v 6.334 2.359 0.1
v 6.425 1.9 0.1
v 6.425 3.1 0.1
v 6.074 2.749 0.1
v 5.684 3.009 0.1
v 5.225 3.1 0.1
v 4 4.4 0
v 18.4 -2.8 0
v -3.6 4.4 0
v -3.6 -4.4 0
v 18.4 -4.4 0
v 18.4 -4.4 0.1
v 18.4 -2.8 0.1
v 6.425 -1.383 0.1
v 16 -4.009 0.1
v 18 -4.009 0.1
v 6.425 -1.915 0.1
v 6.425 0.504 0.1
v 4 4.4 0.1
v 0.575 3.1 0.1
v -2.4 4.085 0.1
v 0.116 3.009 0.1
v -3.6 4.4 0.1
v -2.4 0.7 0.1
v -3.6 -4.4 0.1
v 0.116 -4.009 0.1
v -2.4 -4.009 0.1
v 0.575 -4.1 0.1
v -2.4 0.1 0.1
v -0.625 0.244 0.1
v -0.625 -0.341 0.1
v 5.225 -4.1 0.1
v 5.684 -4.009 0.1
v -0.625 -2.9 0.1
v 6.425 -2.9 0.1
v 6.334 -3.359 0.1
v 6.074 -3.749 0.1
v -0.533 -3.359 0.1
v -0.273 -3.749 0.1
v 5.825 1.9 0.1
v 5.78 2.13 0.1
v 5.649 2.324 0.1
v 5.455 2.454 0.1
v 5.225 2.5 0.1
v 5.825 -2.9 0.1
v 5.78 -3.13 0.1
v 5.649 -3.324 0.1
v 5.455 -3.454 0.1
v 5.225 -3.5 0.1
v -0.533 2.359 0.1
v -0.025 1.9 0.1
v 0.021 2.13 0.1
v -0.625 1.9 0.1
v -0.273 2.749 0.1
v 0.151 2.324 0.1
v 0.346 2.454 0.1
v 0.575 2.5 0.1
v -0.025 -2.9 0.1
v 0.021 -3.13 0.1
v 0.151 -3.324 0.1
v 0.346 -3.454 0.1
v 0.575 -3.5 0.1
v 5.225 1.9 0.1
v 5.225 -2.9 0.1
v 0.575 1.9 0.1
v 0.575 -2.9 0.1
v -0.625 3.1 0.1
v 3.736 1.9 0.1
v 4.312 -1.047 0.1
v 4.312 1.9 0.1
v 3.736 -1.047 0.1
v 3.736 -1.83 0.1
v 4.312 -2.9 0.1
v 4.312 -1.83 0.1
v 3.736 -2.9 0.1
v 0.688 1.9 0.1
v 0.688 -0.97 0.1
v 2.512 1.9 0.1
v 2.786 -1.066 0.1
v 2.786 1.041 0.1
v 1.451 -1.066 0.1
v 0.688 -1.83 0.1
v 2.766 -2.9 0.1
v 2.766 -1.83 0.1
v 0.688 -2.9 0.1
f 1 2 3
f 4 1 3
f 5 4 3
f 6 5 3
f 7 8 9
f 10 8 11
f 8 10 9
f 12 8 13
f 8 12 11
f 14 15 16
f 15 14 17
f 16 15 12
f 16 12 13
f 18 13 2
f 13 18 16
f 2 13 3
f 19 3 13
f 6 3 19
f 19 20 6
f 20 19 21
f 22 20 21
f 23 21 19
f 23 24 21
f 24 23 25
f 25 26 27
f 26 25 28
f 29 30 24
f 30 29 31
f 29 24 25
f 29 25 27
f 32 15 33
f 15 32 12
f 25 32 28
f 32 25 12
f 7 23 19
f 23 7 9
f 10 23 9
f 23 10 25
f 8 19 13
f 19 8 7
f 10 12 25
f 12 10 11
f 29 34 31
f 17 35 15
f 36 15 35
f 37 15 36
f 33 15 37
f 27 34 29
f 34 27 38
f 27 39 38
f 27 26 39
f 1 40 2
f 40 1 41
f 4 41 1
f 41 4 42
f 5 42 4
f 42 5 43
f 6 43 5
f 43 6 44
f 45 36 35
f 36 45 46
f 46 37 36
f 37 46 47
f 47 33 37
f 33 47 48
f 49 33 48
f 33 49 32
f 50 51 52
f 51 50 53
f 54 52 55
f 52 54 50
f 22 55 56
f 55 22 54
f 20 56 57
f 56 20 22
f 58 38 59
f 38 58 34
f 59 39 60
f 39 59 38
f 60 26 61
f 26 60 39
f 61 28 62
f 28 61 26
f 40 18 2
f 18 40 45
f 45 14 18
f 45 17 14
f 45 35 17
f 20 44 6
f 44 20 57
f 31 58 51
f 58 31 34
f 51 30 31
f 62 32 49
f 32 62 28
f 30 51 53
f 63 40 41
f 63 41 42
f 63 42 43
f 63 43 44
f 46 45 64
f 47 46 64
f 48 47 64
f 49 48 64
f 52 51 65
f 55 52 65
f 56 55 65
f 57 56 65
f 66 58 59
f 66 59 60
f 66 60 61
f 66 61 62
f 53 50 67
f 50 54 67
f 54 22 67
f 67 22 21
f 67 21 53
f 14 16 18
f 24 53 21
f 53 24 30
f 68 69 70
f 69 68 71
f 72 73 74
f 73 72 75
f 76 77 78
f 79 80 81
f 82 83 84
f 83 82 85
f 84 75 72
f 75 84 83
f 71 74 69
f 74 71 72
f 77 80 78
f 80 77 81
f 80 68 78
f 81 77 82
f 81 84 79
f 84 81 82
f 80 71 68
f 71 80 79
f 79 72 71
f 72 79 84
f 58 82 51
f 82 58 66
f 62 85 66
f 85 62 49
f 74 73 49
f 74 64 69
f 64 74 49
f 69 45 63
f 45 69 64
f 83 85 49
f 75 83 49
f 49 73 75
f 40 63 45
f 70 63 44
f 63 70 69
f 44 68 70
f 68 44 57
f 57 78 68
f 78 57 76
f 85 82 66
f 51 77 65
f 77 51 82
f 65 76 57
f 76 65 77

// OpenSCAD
// file: ../p/1-4ndis.scad
use <../lib.scad>
function ldraw_lib__1_4ndis() = [
// 0 Disc Negative 0.25
// 0 Name: 1-4ndis.dat
// 0 Author: James Jessiman
// 0 !LDRAW_ORG Primitive UPDATE 2012-01
// 0 !LICENSE Licensed under CC BY 4.0 : see CAreadme.txt
// 
// 0 BFC CERTIFY CCW
  [0,"BFC","CERTIFY"],
  [0,"BFC","CCW"],
// 
// 0 !HISTORY 2002-03-23 [sbliss] Added BFC Statement
// 0 !HISTORY 2002-04-25 [PTadmin] Official Update 2002-02
// 0 !HISTORY 2007-06-22 [PTadmin] Header formatted for Contributor Agreement
// 0 !HISTORY 2008-07-01 [PTadmin] Official Update 2008-01
// 0 !HISTORY 2012-02-16 [Philo] Changed to CCW
// 0 !HISTORY 2012-03-30 [PTadmin] Official Update 2012-01
// 
// 
// 3 16 0.9239 0 0.3827 1 0 0 1 0 1
  [3,16,0.9239,0,0.3827,1,0,0,1,0,1],
// 3 16 0.7071 0 0.7071 0.9239 0 0.3827 1 0 1
  [3,16,0.7071,0,0.7071,0.9239,0,0.3827,1,0,1],
// 3 16 0.3827 0 0.9239 0.7071 0 0.7071 1 0 1
  [3,16,0.3827,0,0.9239,0.7071,0,0.7071,1,0,1],
// 3 16 0 0 1 0.3827 0 0.9239 1 0 1
  [3,16,0,0,1,0.3827,0,0.9239,1,0,1],
];
module ldraw_lib__1_4ndis(step=0, col=false, unit=2/5, alt=false, line=0.2, solid=!$preview)
    makepoly(ldraw_lib__1_4ndis(), step=step, col=col, unit=unit, alt=alt, line=line, solid=solid);
ldraw_lib__1_4ndis(line=0.2);
// file: ../p/3-16ndis.scad
use <../lib.scad>
function ldraw_lib__3_16ndis() = [
// 0 Disc Negative 0.1875
// 0 Name: 3-16ndis.dat
// 0 Author: Guy Vivan [guyvivan]
// 0 !LDRAW_ORG Primitive UPDATE 2009-01
// 0 !LICENSE Licensed under CC BY 2.0 and CC BY 4.0 : see CAreadme.txt
// 
// 0 BFC CERTIFY CCW
  [0,"BFC","CERTIFY"],
  [0,"BFC","CCW"],
// 
// 0 !HISTORY 2009-05-02 [PTadmin] Official Update 2009-01
// 
// 
// 3 16 1 0 1 0.9239 0 0.3827 1 0 0
  [3,16,1,0,1,0.9239,0,0.3827,1,0,0],
// 3 16 1 0 1 0.7071 0 0.7071 0.9239 0 0.3827
  [3,16,1,0,1,0.7071,0,0.7071,0.9239,0,0.3827],
// 3 16 1 0 1 0.3827 0 0.9239 0.7071 0 0.7071
  [3,16,1,0,1,0.3827,0,0.9239,0.7071,0,0.7071],
// 
// 0 end of file
// 
];
module ldraw_lib__3_16ndis(step=0, col=false, unit=2/5, alt=false, line=0.2, solid=!$preview)
    makepoly(ldraw_lib__3_16ndis(), step=step, col=col, unit=unit, alt=alt, line=line, solid=solid);
ldraw_lib__3_16ndis(line=0.2);
// file: ../p/1-4ring1.scad
use <../lib.scad>
function ldraw_lib__1_4ring1() = [
// 0 Ring  1 x 0.25
// 0 Name: 1-4ring1.dat
// 0 Author: Chris Dee [cwdee]
// 0 !LDRAW_ORG Primitive UPDATE 2012-01
// 0 !LICENSE Licensed under CC BY 2.0 and CC BY 4.0 : see CAreadme.txt
// 
// 0 BFC CERTIFY CCW
  [0,"BFC","CERTIFY"],
  [0,"BFC","CCW"],
// 
// 0 !HISTORY 2000-05-07 [PTadmin] Official Update 2000-01
// 0 !HISTORY 2002-11-22 [hafhead] Added BFC statement
// 0 !HISTORY 2002-11-30 [PTadmin] Official Update 2002-05
// 0 !HISTORY 2007-06-22 [PTadmin] Header formatted for Contributor Agreement
// 0 !HISTORY 2008-07-01 [PTadmin] Official Update 2008-01
// 0 !HISTORY 2012-02-16 [Philo] Changed to CCW
// 0 !HISTORY 2012-03-30 [PTadmin] Official Update 2012-01
// 
// 
// 4 16 2 0 0 1.8478 0 0.7654 0.9239 0 0.3827 1 0 0
  [4,16,2,0,0,1.8478,0,0.7654,0.9239,0,0.3827,1,0,0],
// 4 16 1.8478 0 0.7654 1.4142 0 1.4142 0.7071 0 0.7071 0.9239 0 0.3827
  [4,16,1.8478,0,0.7654,1.4142,0,1.4142,0.7071,0,0.7071,0.9239,0,0.3827],
// 4 16 1.4142 0 1.4142 0.7654 0 1.8478 0.3827 0 0.9239 0.7071 0 0.7071
  [4,16,1.4142,0,1.4142,0.7654,0,1.8478,0.3827,0,0.9239,0.7071,0,0.7071],
// 4 16 0.7654 0 1.8478 0 0 2 0 0 1 0.3827 0 0.9239
  [4,16,0.7654,0,1.8478,0,0,2,0,0,1,0.3827,0,0.9239],
];
module ldraw_lib__1_4ring1(step=0, col=false, unit=2/5, alt=false, line=0.2, solid=!$preview)
    makepoly(ldraw_lib__1_4ring1(), step=step, col=col, unit=unit, alt=alt, line=line, solid=solid);
ldraw_lib__1_4ring1(line=0.2);
// file: ../p/1-4disc.scad
use <../lib.scad>
function ldraw_lib__1_4disc() = [
// 0 Disc 0.25
// 0 Name: 1-4disc.dat
// 0 Author: James Jessiman
// 0 !LDRAW_ORG Primitive UPDATE 2002-02
// 0 !LICENSE Licensed under CC BY 4.0 : see CAreadme.txt
// 
// 0 BFC CERTIFY CCW
  [0,"BFC","CERTIFY"],
  [0,"BFC","CCW"],
// 
// 0 !HISTORY 2002-03-23 [sbliss] Added BFC statement.
// 0 !HISTORY 2002-04-25 [PTadmin] Official Update 2002-02
// 0 !HISTORY 2007-06-22 [PTadmin] Header formatted for Contributor Agreement
// 0 !HISTORY 2008-07-01 [PTadmin] Official Update 2008-01
// 
// 
// 3 16 0 0 0 1 0 0 0.9239 0 0.3827
  [3,16,0,0,0,1,0,0,0.9239,0,0.3827],
// 3 16 0 0 0 0.9239 0 0.3827 0.7071 0 0.7071
  [3,16,0,0,0,0.9239,0,0.3827,0.7071,0,0.7071],
// 3 16 0 0 0 0.7071 0 0.7071 0.3827 0 0.9239
  [3,16,0,0,0,0.7071,0,0.7071,0.3827,0,0.9239],
// 3 16 0 0 0 0.3827 0 0.9239 0 0 1
  [3,16,0,0,0,0.3827,0,0.9239,0,0,1],
// 0
];
module ldraw_lib__1_4disc(step=0, col=false, unit=2/5, alt=false, line=0.2, solid=!$preview)
    makepoly(ldraw_lib__1_4disc(), step=step, col=col, unit=unit, alt=alt, line=line, solid=solid);
ldraw_lib__1_4disc(line=0.2);
// file: ../p/type-swiss721bt-bold-n4.scad
use <../lib.scad>
function ldraw_lib__type_swiss721bt_bold_n4() = [
// 0 Type Swiss721BT Number "4" Bold
// 0 Name: type-swiss721bt-bold-n4.dat
// 0 Author: Ulrich Röder [UR]
// 0 !LDRAW_ORG Primitive UPDATE 2019-01
// 0 !LICENSE Licensed under CC BY 4.0 : see CAreadme.txt
// 
// 0 BFC CERTIFY CCW
  [0,"BFC","CERTIFY"],
  [0,"BFC","CCW"],
// 
// 0 !HISTORY 2019-06-28 [PTadmin] Official Update 2019-01
// 
// 
// 0 // Main
// 4 16 .3775 0 .5 .2575 0 .5 .2575 0 -.114 .3775 0 -.114
  [4,16,.3775,0,.5,.2575,0,.5,.2575,0,-.114,.3775,0,-.114],
// 4 16 .2575 0 -.5 .3775 0 -.5 .3775 0 -.277 .2575 0 -.277
  [4,16,.2575,0,-.5,.3775,0,-.5,.3775,0,-.277,.2575,0,-.277],
// 3 16 -.3775 0 .5 -.3775 0 -.098 .0025 0 .5
  [3,16,-.3775,0,.5,-.3775,0,-.098,.0025,0,.5],
// 3 16 .0595 0 -.118 .0595 0 .321 -.2185 0 -.118
  [3,16,.0595,0,-.118,.0595,0,.321,-.2185,0,-.118],
// 4 16 .0555 0 -.5 .0555 0 -.277 -.3775 0 -.277 -.3775 0 -.5
  [4,16,.0555,0,-.5,.0555,0,-.277,-.3775,0,-.277,-.3775,0,-.5],
// 
// 0 // Black
// 4 0 .0555 0 -.5 .2575 0 -.5 .2575 0 -.277 .0555 0 -.277
  [4,0,.0555,0,-.5,.2575,0,-.5,.2575,0,-.277,.0555,0,-.277],
// 4 0 .2575 0 -.114 .2575 0 -.277 .3775 0 -.277 .3775 0 -.114
  [4,0,.2575,0,-.114,.2575,0,-.277,.3775,0,-.277,.3775,0,-.114],
// 4 0 -.2185 0 -.118 .0595 0 .321 .0025 0 .5 -.3775 0 -.098
  [4,0,-.2185,0,-.118,.0595,0,.321,.0025,0,.5,-.3775,0,-.098],
// 3 0 .0595 0 .321 .2575 0 .5 .0025 0 .5
  [3,0,.0595,0,.321,.2575,0,.5,.0025,0,.5],
// 3 0 -.2185 0 -.118 -.3775 0 -.098 -.3775 0 -.277
  [3,0,-.2185,0,-.118,-.3775,0,-.098,-.3775,0,-.277],
// 4 0 .0595 0 -.118 -.2185 0 -.118 -.3775 0 -.277 .0555 0 -.277
  [4,0,.0595,0,-.118,-.2185,0,-.118,-.3775,0,-.277,.0555,0,-.277],
// 4 0 .2575 0 -.114 .2575 0 .5 .0595 0 .321 .0595 0 -.118
  [4,0,.2575,0,-.114,.2575,0,.5,.0595,0,.321,.0595,0,-.118],
// 4 0 .0555 0 -.277 .2575 0 -.277 .2575 0 -.114 .0595 0 -.118
  [4,0,.0555,0,-.277,.2575,0,-.277,.2575,0,-.114,.0595,0,-.118],
];
module ldraw_lib__type_swiss721bt_bold_n4(step=0, col=false, unit=2/5, alt=false, line=0.2, solid=!$preview)
    makepoly(ldraw_lib__type_swiss721bt_bold_n4(), step=step, col=col, unit=unit, alt=alt, line=line, solid=solid);
ldraw_lib__type_swiss721bt_bold_n4(line=0.2);
// file: s/821435as03.scad
use <../../lib.scad>
use <../../p/1-4ndis.scad>
function ldraw_lib__s__821435as03() = [
// 0 ~Sticker Sloped Body for Racing Number
// 0 Name: s\821435as03.dat
// 0 Author: Ulrich Röder [UR]
// 0 !LDRAW_ORG Subpart UPDATE 2019-01
// 0 !LICENSE Licensed under CC BY 4.0 : see CAreadme.txt
// 
// 0 BFC CERTIFY CCW
  [0,"BFC","CERTIFY"],
  [0,"BFC","CCW"],
// 
// 0 !HISTORY 2019-06-28 [PTadmin] Official Update 2019-01
// 
// 
// 0 // Main
// 1 16 13.063 -.25 4.75 3 0 0 0 1 0 0 0 3 1-4ndis.dat
  [1,16,13.063,-.25,4.75,3,0,0,0,1,0,0,0,3, ldraw_lib__1_4ndis()],
// 3 16 10 0 11 46 0 -7 -9 0 11
  [3,16,10,0,11,46,0,-7,-9,0,11],
// 4 16 -9 0 -11 -9 0 11 46 0 -7 46 0 -11
  [4,16,-9,0,-11,-9,0,11,46,0,-7,46,0,-11],
// 4 16 46 -.25 -11 46 0 -11 46 0 -7 46 -.25 -7
  [4,16,46,-.25,-11,46,0,-11,46,0,-7,46,-.25,-7],
// 4 16 16.063 -.25 -4.788 40 -.25 -10.022 45 -.25 -10.022 16.063 -.25 -3.458
  [4,16,16.063,-.25,-4.788,40,-.25,-10.022,45,-.25,-10.022,16.063,-.25,-3.458],
// 3 16 45 -.25 -10.022 40 -.25 -10.022 46 -.25 -11
  [3,16,45,-.25,-10.022,40,-.25,-10.022,46,-.25,-11],
// 3 16 45 -.25 -10.022 46 -.25 -11 46 -.25 -7
  [3,16,45,-.25,-10.022,46,-.25,-11,46,-.25,-7],
// 4 16 16.063 -.25 4.75 16.063 -.25 1.261 45 -.25 -10.022 46 -.25 -7
  [4,16,16.063,-.25,4.75,16.063,-.25,1.261,45,-.25,-10.022,46,-.25,-7],
// 3 16 16.063 -.25 4.75 46 -.25 -7 16.063 -.25 7.75
  [3,16,16.063,-.25,4.75,46,-.25,-7,16.063,-.25,7.75],
// 3 16 10 -.25 11 16.063 -.25 7.75 46 -.25 -7
  [3,16,10,-.25,11,16.063,-.25,7.75,46,-.25,-7],
// 3 16 13.063 -.25 7.75 16.063 -.25 7.75 10 -.25 11
  [3,16,13.063,-.25,7.75,16.063,-.25,7.75,10,-.25,11],
// 4 16 -6 -.25 10.213 1.438 -.25 7.75 13.063 -.25 7.75 10 -.25 11
  [4,16,-6,-.25,10.213,1.438,-.25,7.75,13.063,-.25,7.75,10,-.25,11],
// 3 16 .2899 -.25 7.5217 1.438 -.25 7.75 -6 -.25 10.213
  [3,16,.2899,-.25,7.5217,1.438,-.25,7.75,-6,-.25,10.213],
// 3 16 -9 -.25 11 -6 -.25 10.213 10 -.25 11
  [3,16,-9,-.25,11,-6,-.25,10.213,10,-.25,11],
// 4 16 -9 -.25 -11 -6 -.25 1.75 -6 -.25 10.213 -9 -.25 11
  [4,16,-9,-.25,-11,-6,-.25,1.75,-6,-.25,10.213,-9,-.25,11],
// 4 16 1.438 -.25 -10.25 .2899 -.25 -10.0217 -6 -.25 -10.022 -9 -.25 -11
  [4,16,1.438,-.25,-10.25,.2899,-.25,-10.0217,-6,-.25,-10.022,-9,-.25,-11],
// 4 16 -1.563 -.25 .61 -6 -.25 1.75 -6 -.25 .25 -1.563 -.25 -.853
  [4,16,-1.563,-.25,.61,-6,-.25,1.75,-6,-.25,.25,-1.563,-.25,-.853],
// 3 16 -6 -.25 .25 -6 -.25 1.75 -9 -.25 -11
  [3,16,-6,-.25,.25,-6,-.25,1.75,-9,-.25,-11],
// 3 16 -6 -.25 .25 -9 -.25 -11 -6 -.25 -10.022
  [3,16,-6,-.25,.25,-9,-.25,-11,-6,-.25,-10.022],
// 4 16 40 -.25 -10.022 14.2111 -.25 -10.0217 13.063 -.25 -10.25 46 -.25 -11
  [4,16,40,-.25,-10.022,14.2111,-.25,-10.0217,13.063,-.25,-10.25,46,-.25,-11],
// 4 16 1.438 -.25 -10.25 -9 -.25 -11 46 -.25 -11 13.063 -.25 -10.25
  [4,16,1.438,-.25,-10.25,-9,-.25,-11,46,-.25,-11,13.063,-.25,-10.25],
// 4 16 -9 -.25 11 10 -.25 11 10 0 11 -9 0 11
  [4,16,-9,-.25,11,10,-.25,11,10,0,11,-9,0,11],
// 4 16 -9 0 11 -9 0 -11 -9 -.25 -11 -9 -.25 11
  [4,16,-9,0,11,-9,0,-11,-9,-.25,-11,-9,-.25,11],
// 4 16 10 -.25 11 46 -.25 -7 46 0 -7 10 0 11
  [4,16,10,-.25,11,46,-.25,-7,46,0,-7,10,0,11],
// 4 16 46 0 -11 46 -.25 -11 -9 -.25 -11 -9 0 -11
  [4,16,46,0,-11,46,-.25,-11,-9,-.25,-11,-9,0,-11],
];
module ldraw_lib__s__821435as03(step=0, col=false, unit=2/5, alt=false, line=0.2, solid=!$preview)
    makepoly(ldraw_lib__s__821435as03(), step=step, col=col, unit=unit, alt=alt, line=line, solid=solid);
ldraw_lib__s__821435as03(line=0.2);
// file: s/821435as02.scad
use <../../lib.scad>
use <../../p/3-16ndis.scad>
function ldraw_lib__s__821435as02() = [
// 0 ~Sticker Upper Triangle with Cutout for Racing Number
// 0 Name: s\821435as02.dat
// 0 Author: Ulrich Röder [UR]
// 0 !LDRAW_ORG Subpart UPDATE 2019-01
// 0 !LICENSE Licensed under CC BY 4.0 : see CAreadme.txt
// 
// 0 BFC CERTIFY CCW
  [0,"BFC","CERTIFY"],
  [0,"BFC","CCW"],
// 
// 0 !HISTORY 2019-06-28 [PTadmin] Official Update 2019-01
// 
// 
// 0 // Main
// 1 16 1.438 -.25 4.75 -3 0 0 0 1 0 0 0 3 3-16ndis.dat
  [1,16,1.438,-.25,4.75,-3,0,0,0,1,0,0,0,3, ldraw_lib__3_16ndis()],
// 3 16 -1.562 -.25 7.75 .2899 -.25 7.5217 -6 -.25 10.213
  [3,16,-1.562,-.25,7.75,.2899,-.25,7.5217,-6,-.25,10.213],
// 3 16 -1.562 -.25 7.75 -6 -.25 10.213 -1.562 -.25 4.75
  [3,16,-1.562,-.25,7.75,-6,-.25,10.213,-1.562,-.25,4.75],
// 3 16 16.063 -.25 -3.458 45 -.25 -10.022 16.063 -.25 1.261
  [3,16,16.063,-.25,-3.458,45,-.25,-10.022,16.063,-.25,1.261],
// 4 16 -6 -.25 1.75 -1.563 -.25 .61 -1.562 -.25 4.75 -6 -.25 10.213
  [4,16,-6,-.25,1.75,-1.563,-.25,.61,-1.562,-.25,4.75,-6,-.25,10.213],
];
module ldraw_lib__s__821435as02(step=0, col=false, unit=2/5, alt=false, line=0.2, solid=!$preview)
    makepoly(ldraw_lib__s__821435as02(), step=step, col=col, unit=unit, alt=alt, line=line, solid=solid);
ldraw_lib__s__821435as02(line=0.2);
// file: s/821435as01.scad
use <../../lib.scad>
use <../../p/1-4disc.scad>
use <../../p/1-4ring1.scad>
function ldraw_lib__s__821435as01() = [
// 0 ~Sticker Lower Triangle and Racing Number Frame
// 0 Name: s\821435as01.dat
// 0 Author: Ulrich Röder [UR]
// 0 !LDRAW_ORG Subpart UPDATE 2019-01
// 0 !LICENSE Licensed under CC BY 4.0 : see CAreadme.txt
// 
// 0 BFC CERTIFY CCW
  [0,"BFC","CERTIFY"],
  [0,"BFC","CCW"],
// 
// 0 !HISTORY 2019-06-28 [PTadmin] Official Update 2019-01
// 
// 
// 0 // Main
// 
// 3 16 -6 -0.25 0.25 -1.562 -0.25 -7.25 -1.563 -0.25 -0.853
  [3,16,-6,-0.25,0.25,-1.562,-0.25,-7.25,-1.563,-0.25,-0.853],
// 3 16 16.063 -0.25 -4.788 16.063 -0.25 -7.25 40 -0.25 -10.022
  [3,16,16.063,-0.25,-4.788,16.063,-0.25,-7.25,40,-0.25,-10.022],
// 3 16 15.8347 -0.25 -8.3981 40 -0.25 -10.022 16.063 -0.25 -7.25
  [3,16,15.8347,-0.25,-8.3981,40,-0.25,-10.022,16.063,-0.25,-7.25],
// 3 16 15.1843 -0.25 -9.3713 40 -0.25 -10.022 15.8347 -0.25 -8.3981
  [3,16,15.1843,-0.25,-9.3713,40,-0.25,-10.022,15.8347,-0.25,-8.3981],
// 3 16 14.2111 -0.25 -10.0217 40 -0.25 -10.022 15.1843 -0.25 -9.3713
  [3,16,14.2111,-0.25,-10.0217,40,-0.25,-10.022,15.1843,-0.25,-9.3713],
// 4 16 -6 -0.25 0.25 -6 -0.25 -10.022 -1.3337 -0.25 -8.3981 -1.562 -0.25 -7.25
  [4,16,-6,-0.25,0.25,-6,-0.25,-10.022,-1.3337,-0.25,-8.3981,-1.562,-0.25,-7.25],
// 3 16 -6 -0.25 -10.022 -0.6833 -0.25 -9.3713 -1.3337 -0.25 -8.3981
  [3,16,-6,-0.25,-10.022,-0.6833,-0.25,-9.3713,-1.3337,-0.25,-8.3981],
// 3 16 -6 -0.25 -10.022 0.2899 -0.25 -10.0217 -0.6833 -0.25 -9.3713
  [3,16,-6,-0.25,-10.022,0.2899,-0.25,-10.0217,-0.6833,-0.25,-9.3713],
// 
// 0 // Black
// 1 0 13.063 -.25 4.75 1.5 0 0 0 1 0 0 0 1.5 1-4ring1.dat
  [1,0,13.063,-.25,4.75,1.5,0,0,0,1,0,0,0,1.5, ldraw_lib__1_4ring1()],
// 1 0 13.063 -.25 -7.25 1.5 0 0 0 1 0 0 0 -1.5 1-4ring1.dat
  [1,0,13.063,-.25,-7.25,1.5,0,0,0,1,0,0,0,-1.5, ldraw_lib__1_4ring1()],
// 1 0 1.438 -.25 4.75 -1.5 0 0 0 1 0 0 0 1.5 1-4ring1.dat
  [1,0,1.438,-.25,4.75,-1.5,0,0,0,1,0,0,0,1.5, ldraw_lib__1_4ring1()],
// 1 0 1.438 -.25 -7.25 -1.5 0 0 0 1 0 0 0 -1.5 1-4ring1.dat
  [1,0,1.438,-.25,-7.25,-1.5,0,0,0,1,0,0,0,-1.5, ldraw_lib__1_4ring1()],
// 4 0 14.563 -0.25 4.75 14.563 -0.25 -7.25 16.063 -0.25 1.261 16.063 -0.25 4.75
  [4,0,14.563,-0.25,4.75,14.563,-0.25,-7.25,16.063,-0.25,1.261,16.063,-0.25,4.75],
// 3 0 14.563 -0.25 -7.25 16.063 -0.25 -3.458 16.063 -0.25 1.261
  [3,0,14.563,-0.25,-7.25,16.063,-0.25,-3.458,16.063,-0.25,1.261],
// 3 0 14.563 -0.25 -7.25 16.063 -0.25 -4.788 16.063 -0.25 -3.458
  [3,0,14.563,-0.25,-7.25,16.063,-0.25,-4.788,16.063,-0.25,-3.458],
// 3 0 14.563 -0.25 -7.25 16.063 -0.25 -7.25 16.063 -0.25 -4.788
  [3,0,14.563,-0.25,-7.25,16.063,-0.25,-7.25,16.063,-0.25,-4.788],
// 4 0 13.063 -0.25 6.25 13.063 -0.25 7.75 1.438 -0.25 7.75 1.438 -0.25 6.25
  [4,0,13.063,-0.25,6.25,13.063,-0.25,7.75,1.438,-0.25,7.75,1.438,-0.25,6.25],
// 4 0 -0.062 -0.25 4.75 -1.563 -0.25 -0.853 -1.562 -0.25 -7.25 -0.062 -0.25 -7.25
  [4,0,-0.062,-0.25,4.75,-1.563,-0.25,-0.853,-1.562,-0.25,-7.25,-0.062,-0.25,-7.25],
// 3 0 -0.062 -0.25 4.75 -1.563 -0.25 0.61 -1.563 -0.25 -0.853
  [3,0,-0.062,-0.25,4.75,-1.563,-0.25,0.61,-1.563,-0.25,-0.853],
// 4 0 1.438 -0.25 -10.25 13.063 -0.25 -10.25 13.063 -0.25 -8.75 1.438 -0.25 -8.75
  [4,0,1.438,-0.25,-10.25,13.063,-0.25,-10.25,13.063,-0.25,-8.75,1.438,-0.25,-8.75],
// 3 0 -1.563 -0.25 0.61 -0.062 -0.25 4.75 -1.562 -0.25 4.75
  [3,0,-1.563,-0.25,0.61,-0.062,-0.25,4.75,-1.562,-0.25,4.75],
// 
// 0 // White
// 1 15 13.063 -.25 4.75 1.5 0 0 0 1 0 0 0 1.5 1-4disc.dat
  [1,15,13.063,-.25,4.75,1.5,0,0,0,1,0,0,0,1.5, ldraw_lib__1_4disc()],
// 1 15 13.063 -.25 -7.25 1.5 0 0 0 1 0 0 0 -1.5 1-4disc.dat
  [1,15,13.063,-.25,-7.25,1.5,0,0,0,1,0,0,0,-1.5, ldraw_lib__1_4disc()],
// 1 15 1.438 -.25 4.75 -1.5 0 0 0 1 0 0 0 1.5 1-4disc.dat
  [1,15,1.438,-.25,4.75,-1.5,0,0,0,1,0,0,0,1.5, ldraw_lib__1_4disc()],
// 1 15 1.438 -.25 -7.25 -1.5 0 0 0 1 0 0 0 -1.5 1-4disc.dat
  [1,15,1.438,-.25,-7.25,-1.5,0,0,0,1,0,0,0,-1.5, ldraw_lib__1_4disc()],
];
module ldraw_lib__s__821435as01(step=0, col=false, unit=2/5, alt=false, line=0.2, solid=!$preview)
    makepoly(ldraw_lib__s__821435as01(), step=step, col=col, unit=unit, alt=alt, line=line, solid=solid);
ldraw_lib__s__821435as01(line=0.2);
// main file
use <../lib.scad>
use <s/821435as01.scad>
use <s/821435as02.scad>
use <s/821435as03.scad>
use <../p/type-swiss721bt-bold-n4.scad>
function ldraw_lib__821435g() = [
// 0 Sticker with White/Red Triangles and Racing Number "4", Right
// 0 Name: 821435g.dat
// 0 Author: Ulrich Röder [UR]
// 0 !LDRAW_ORG Part UPDATE 2019-01
// 0 !LICENSE Licensed under CC BY 4.0 : see CAreadme.txt
// 
// 0 BFC CERTIFY CCW
  [0,"BFC","CERTIFY"],
  [0,"BFC","CCW"],
// 
// 0 !KEYWORDS cup, Racers, Set 6539
// 
// 0 !HISTORY 2019-06-28 [PTadmin] Official Update 2019-01
// 
// 
// 0 // Main
// 
// 1 16 0 0 0 1 0 0 0 1 0 0 0 1 s\821435as03.dat
  [1,16,0,0,0,1,0,0,0,1,0,0,0,1, ldraw_lib__s__821435as03()],
// 
// 0 // Red
// 1 4 0 0 0 1 0 0 0 1 0 0 0 1 s\821435as01.dat
  [1,4,0,0,0,1,0,0,0,1,0,0,0,1, ldraw_lib__s__821435as01()],
// 
// 0 // White
// 1 15 0 0 0 1 0 0 0 1 0 0 0 1 s\821435as02.dat
  [1,15,0,0,0,1,0,0,0,1,0,0,0,1, ldraw_lib__s__821435as02()],
// 1 15 6.25 -.25 -1.25 12 0 0 0 1 0 0 0 12 type-swiss721bt-bold-n4.dat
  [1,15,6.25,-.25,-1.25,12,0,0,0,1,0,0,0,12, ldraw_lib__type_swiss721bt_bold_n4()],
// 4 15 1.72 -.25 -4.574 -.062 -.25 4.75 -.062 -.25 -7.25 1.438 -.25 -7.25
  [4,15,1.72,-.25,-4.574,-.062,-.25,4.75,-.062,-.25,-7.25,1.438,-.25,-7.25],
// 4 15 13.063 -.25 -8.75 1.72 -.25 -7.25 1.438 -.25 -7.25 1.438 -.25 -8.75
  [4,15,13.063,-.25,-8.75,1.72,-.25,-7.25,1.438,-.25,-7.25,1.438,-.25,-8.75],
// 3 15 10.78 -.25 -4.574 10.78 -.25 -7.25 13.063 -.25 -8.75
  [3,15,10.78,-.25,-4.574,10.78,-.25,-7.25,13.063,-.25,-8.75],
// 4 15 10.78 -.25 -2.618 10.78 -.25 -4.574 13.063 -.25 -8.75 13.063 -.25 -7.25
  [4,15,10.78,-.25,-2.618,10.78,-.25,-4.574,13.063,-.25,-8.75,13.063,-.25,-7.25],
// 4 15 13.063 -.25 4.75 10.78 -.25 -2.618 13.063 -.25 -7.25 14.563 -.25 -7.25
  [4,15,13.063,-.25,4.75,10.78,-.25,-2.618,13.063,-.25,-7.25,14.563,-.25,-7.25],
// 3 15 6.916 -.25 -7.25 1.72 -.25 -7.25 13.063 -.25 -8.75
  [3,15,6.916,-.25,-7.25,1.72,-.25,-7.25,13.063,-.25,-8.75],
// 3 15 9.34 -.25 -7.25 6.916 -.25 -7.25 13.063 -.25 -8.75
  [3,15,9.34,-.25,-7.25,6.916,-.25,-7.25,13.063,-.25,-8.75],
// 3 15 13.063 -.25 -8.75 10.78 -.25 -7.25 9.34 -.25 -7.25
  [3,15,13.063,-.25,-8.75,10.78,-.25,-7.25,9.34,-.25,-7.25],
// 3 15 14.563 -.25 4.75 13.063 -.25 4.75 14.563 -.25 -7.25
  [3,15,14.563,-.25,4.75,13.063,-.25,4.75,14.563,-.25,-7.25],
// 4 15 13.063 -.25 6.25 10.78 -.25 4.75 10.78 -.25 -2.618 13.063 -.25 4.75
  [4,15,13.063,-.25,6.25,10.78,-.25,4.75,10.78,-.25,-2.618,13.063,-.25,4.75],
// 4 15 13.063 -.25 6.25 1.438 -.25 6.25 9.34 -.25 4.75 10.78 -.25 4.75
  [4,15,13.063,-.25,6.25,1.438,-.25,6.25,9.34,-.25,4.75,10.78,-.25,4.75],
// 3 15 1.438 -.25 6.25 6.28 -.25 4.75 9.34 -.25 4.75
  [3,15,1.438,-.25,6.25,6.28,-.25,4.75,9.34,-.25,4.75],
// 3 15 6.28 -.25 4.75 1.438 -.25 6.25 1.72 -.25 4.75
  [3,15,6.28,-.25,4.75,1.438,-.25,6.25,1.72,-.25,4.75],
// 3 15 1.72 -.25 -7.25 1.72 -.25 -4.574 1.438 -.25 -7.25
  [3,15,1.72,-.25,-7.25,1.72,-.25,-4.574,1.438,-.25,-7.25],
// 4 15 1.438 -.25 4.75 -.062 -.25 4.75 1.72 -.25 -4.574 1.72 -.25 -2.426
  [4,15,1.438,-.25,4.75,-.062,-.25,4.75,1.72,-.25,-4.574,1.72,-.25,-2.426],
// 4 15 1.438 -.25 6.25 1.438 -.25 4.75 1.72 -.25 -2.426 1.72 -.25 4.75
  [4,15,1.438,-.25,6.25,1.438,-.25,4.75,1.72,-.25,-2.426,1.72,-.25,4.75],
];
module ldraw_lib__821435g(step=0, col=false, unit=2/5, alt=false, line=0.2, solid=!$preview)
    makepoly(ldraw_lib__821435g(), step=step, col=col, unit=unit, alt=alt, line=line, solid=solid);
ldraw_lib__821435g(line=0.2);
